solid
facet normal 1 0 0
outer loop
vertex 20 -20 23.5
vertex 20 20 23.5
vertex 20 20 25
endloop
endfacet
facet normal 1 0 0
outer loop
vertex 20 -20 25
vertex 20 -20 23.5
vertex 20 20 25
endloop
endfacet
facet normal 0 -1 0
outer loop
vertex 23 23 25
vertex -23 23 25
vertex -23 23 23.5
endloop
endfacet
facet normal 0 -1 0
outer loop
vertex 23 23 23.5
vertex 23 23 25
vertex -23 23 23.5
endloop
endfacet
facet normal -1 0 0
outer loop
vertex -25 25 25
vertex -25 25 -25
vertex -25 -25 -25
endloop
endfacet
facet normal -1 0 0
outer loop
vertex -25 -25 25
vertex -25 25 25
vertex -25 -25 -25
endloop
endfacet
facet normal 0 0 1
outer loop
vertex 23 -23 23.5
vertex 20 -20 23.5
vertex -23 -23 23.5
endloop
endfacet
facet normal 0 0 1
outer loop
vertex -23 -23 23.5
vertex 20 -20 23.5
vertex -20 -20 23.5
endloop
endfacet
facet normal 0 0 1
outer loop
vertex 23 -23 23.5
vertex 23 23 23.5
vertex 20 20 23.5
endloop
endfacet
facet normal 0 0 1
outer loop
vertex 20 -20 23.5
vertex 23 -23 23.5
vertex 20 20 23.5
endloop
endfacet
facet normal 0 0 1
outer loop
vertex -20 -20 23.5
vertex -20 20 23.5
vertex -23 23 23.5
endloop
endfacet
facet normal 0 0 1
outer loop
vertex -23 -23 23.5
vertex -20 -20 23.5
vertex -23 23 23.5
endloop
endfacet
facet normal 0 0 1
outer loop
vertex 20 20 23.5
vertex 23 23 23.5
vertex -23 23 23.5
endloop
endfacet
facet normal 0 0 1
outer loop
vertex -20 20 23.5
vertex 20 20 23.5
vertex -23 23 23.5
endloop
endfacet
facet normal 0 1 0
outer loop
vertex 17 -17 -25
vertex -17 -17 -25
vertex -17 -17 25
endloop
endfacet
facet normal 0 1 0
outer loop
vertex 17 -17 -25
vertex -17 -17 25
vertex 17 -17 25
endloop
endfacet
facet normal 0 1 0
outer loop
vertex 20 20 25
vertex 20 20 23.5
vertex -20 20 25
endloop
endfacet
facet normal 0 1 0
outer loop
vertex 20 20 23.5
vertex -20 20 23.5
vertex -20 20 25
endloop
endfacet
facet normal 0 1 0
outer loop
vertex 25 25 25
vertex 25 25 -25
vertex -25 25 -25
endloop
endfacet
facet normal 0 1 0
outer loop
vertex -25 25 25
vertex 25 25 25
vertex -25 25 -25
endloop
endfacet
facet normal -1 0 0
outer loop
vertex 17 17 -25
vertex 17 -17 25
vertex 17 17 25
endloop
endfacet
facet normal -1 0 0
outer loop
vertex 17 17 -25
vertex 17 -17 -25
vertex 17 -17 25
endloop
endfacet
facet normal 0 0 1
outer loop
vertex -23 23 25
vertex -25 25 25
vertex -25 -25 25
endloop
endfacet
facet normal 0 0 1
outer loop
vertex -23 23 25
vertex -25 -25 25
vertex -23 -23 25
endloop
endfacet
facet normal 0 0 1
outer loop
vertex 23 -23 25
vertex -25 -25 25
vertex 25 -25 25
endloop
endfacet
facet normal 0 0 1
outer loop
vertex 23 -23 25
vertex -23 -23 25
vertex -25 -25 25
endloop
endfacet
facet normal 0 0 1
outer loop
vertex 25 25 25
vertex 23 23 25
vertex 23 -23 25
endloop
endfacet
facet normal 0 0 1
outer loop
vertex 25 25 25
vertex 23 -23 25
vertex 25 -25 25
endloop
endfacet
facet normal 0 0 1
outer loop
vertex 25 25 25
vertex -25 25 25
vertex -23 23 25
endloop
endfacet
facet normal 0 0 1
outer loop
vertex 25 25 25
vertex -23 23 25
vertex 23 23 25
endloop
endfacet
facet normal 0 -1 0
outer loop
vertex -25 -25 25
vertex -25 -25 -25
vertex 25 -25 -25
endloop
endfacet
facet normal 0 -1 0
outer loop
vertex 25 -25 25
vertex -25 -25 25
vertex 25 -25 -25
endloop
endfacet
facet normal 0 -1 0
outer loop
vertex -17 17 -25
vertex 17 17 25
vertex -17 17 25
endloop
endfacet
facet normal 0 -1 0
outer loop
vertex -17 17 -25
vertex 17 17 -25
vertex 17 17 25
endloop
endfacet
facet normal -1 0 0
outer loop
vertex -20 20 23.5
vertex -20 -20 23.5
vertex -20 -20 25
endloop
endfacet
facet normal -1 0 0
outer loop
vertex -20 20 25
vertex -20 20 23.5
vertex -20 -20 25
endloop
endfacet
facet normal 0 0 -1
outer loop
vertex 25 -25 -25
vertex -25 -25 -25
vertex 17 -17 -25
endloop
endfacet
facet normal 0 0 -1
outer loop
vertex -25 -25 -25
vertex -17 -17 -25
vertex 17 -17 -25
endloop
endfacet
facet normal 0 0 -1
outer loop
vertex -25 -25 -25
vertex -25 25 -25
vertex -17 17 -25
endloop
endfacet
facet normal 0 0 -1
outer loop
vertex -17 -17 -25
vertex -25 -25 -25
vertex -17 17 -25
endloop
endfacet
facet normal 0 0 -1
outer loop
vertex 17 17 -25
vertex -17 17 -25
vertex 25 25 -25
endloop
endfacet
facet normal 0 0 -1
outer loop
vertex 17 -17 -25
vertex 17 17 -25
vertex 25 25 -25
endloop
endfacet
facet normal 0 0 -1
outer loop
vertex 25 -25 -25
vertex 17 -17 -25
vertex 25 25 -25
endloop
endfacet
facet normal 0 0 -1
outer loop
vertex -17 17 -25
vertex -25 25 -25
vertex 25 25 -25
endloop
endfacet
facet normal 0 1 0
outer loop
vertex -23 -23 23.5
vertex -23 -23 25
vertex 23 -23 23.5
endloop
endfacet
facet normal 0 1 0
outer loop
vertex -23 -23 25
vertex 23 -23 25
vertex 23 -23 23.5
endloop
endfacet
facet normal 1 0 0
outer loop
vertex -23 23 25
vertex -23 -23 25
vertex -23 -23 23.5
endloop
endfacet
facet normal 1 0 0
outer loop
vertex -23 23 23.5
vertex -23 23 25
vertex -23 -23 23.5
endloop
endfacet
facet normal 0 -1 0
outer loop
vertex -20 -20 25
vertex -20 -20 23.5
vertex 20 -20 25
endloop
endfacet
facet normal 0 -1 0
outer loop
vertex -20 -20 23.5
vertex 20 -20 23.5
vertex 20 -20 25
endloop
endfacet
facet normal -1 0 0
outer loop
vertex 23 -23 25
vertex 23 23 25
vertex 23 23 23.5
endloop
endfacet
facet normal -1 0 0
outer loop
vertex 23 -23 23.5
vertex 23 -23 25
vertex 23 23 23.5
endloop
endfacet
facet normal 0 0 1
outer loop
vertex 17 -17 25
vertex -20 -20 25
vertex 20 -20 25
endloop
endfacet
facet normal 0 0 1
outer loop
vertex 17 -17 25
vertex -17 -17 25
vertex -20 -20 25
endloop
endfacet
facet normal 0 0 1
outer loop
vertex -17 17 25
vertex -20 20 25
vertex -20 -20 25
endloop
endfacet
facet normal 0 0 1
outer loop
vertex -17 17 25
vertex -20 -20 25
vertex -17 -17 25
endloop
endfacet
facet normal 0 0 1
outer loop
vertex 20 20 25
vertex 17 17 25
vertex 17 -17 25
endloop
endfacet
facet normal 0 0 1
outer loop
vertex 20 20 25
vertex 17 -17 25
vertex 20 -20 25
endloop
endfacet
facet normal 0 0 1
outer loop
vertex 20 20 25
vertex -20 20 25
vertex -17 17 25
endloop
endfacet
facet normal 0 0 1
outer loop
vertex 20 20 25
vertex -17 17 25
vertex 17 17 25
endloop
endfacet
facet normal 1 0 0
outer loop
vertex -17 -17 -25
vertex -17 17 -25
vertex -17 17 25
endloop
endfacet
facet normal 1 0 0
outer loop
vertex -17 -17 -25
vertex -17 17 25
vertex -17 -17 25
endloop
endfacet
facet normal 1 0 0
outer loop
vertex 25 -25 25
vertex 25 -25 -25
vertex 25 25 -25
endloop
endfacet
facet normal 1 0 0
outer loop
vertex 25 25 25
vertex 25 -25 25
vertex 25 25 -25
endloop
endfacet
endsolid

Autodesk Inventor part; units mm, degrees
ref_plane "YZ Plane" through (0, 0, 0) normal (1, 0, 0) x (0, 1, 0)
ref_plane "XZ Plane" through (0, 0, 0) normal (0, 1, 0) x (-1, 0, 0)
ref_plane "XY Plane" through (0, 0, 0) normal (0, 0, 1) x (1, 0, 0)
sketch "Esboço1" plane through (0, 0, 0) normal (0, 0, 1) x (1, 0, 0)
  line L0 (-25, -25) -> (25, -25)
  line L1 (25, -25) -> (25, 25)
  line L2 (25, 25) -> (-25, 25)
  line L3 (-25, 25) -> (-25, -25)
  line L4 (-25, -25) -> (25, 25) construction
  line L5 (25, -25) -> (-25, 25) construction
  line L6 (-17, -17) -> (17, -17)
  line L7 (17, -17) -> (17, 17)
  line L8 (17, 17) -> (-17, 17)
  line L9 (-17, 17) -> (-17, -17)
  line L10 (-17, -17) -> (17, 17) construction
  line L11 (17, -17) -> (-17, 17) construction
  point P0 (0, 0)
  dimension "d0" = 50
  dimension "d2" = 8
extrude "Extrusão1" add sketch "Esboço1" along normal mid plane 50
sketch "Esboço2" plane through (0, 0, 25) normal (0, 0, 1) x (1, 0, 0)
  line L0 (-21.5, -21.5) -> (21.5, -21.5)
  line L1 (21.5, -21.5) -> (21.5, 21.5)
  line L2 (21.5, 21.5) -> (-21.5, 21.5)
  line L3 (-21.5, 21.5) -> (-21.5, -21.5)
  line L4 (-21.5, -21.5) -> (21.5, 21.5) construction
  line L5 (21.5, -21.5) -> (-21.5, 21.5) construction
  line L6 (25, 25) -> (-25, 25) projected
  point P0 (0, 0)
  point P1 (0, 21.5)
  point P2 (0, -21.5)
  point P3 (-21.5, 0)
  point P4 (21.5, 0)
  dimension "d5" = 3.5
sketch "Esboço3" plane through (0, 0, 25) normal (0, 0, 1) x (1, 0, 0)
  point P0 (0, 0)
sketch "Esboço8" plane through (0, 0, 0) normal (0, 1, 0) x (-1, 0, 0)
  point P0 (0, 0)
sketch "Esboço9" plane through (0, 0, 0) normal (0, 1, 0) x (-1, 0, 0)
  line L0 (-23, 23.5) -> (-20, 23.5)
  line L1 (-20, 23.5) -> (-20, 26.5)
  line L2 (-20, 26.5) -> (-23, 26.5)
  line L3 (-23, 26.5) -> (-23, 23.5)
  line L4 (25, 25) -> (-25, 25) projected
  line L5 (-23, 23.5) -> (-20, 26.5) construction
  line L6 (-20, 23.5) -> (-23, 26.5) construction
  point P0 (0, 0)
  point P1 (-21.5, 25)
  dimension "d6" = 3
  dimension "d7" = 21.5
sweep "Varredura1" cut profiles "Esboço9" path "Esboço2" path curves L1 L0 L3 L2
equation "\"d3\" = d0"
properties part number "Sweep_0002_001" material "Nitreto de silício"
